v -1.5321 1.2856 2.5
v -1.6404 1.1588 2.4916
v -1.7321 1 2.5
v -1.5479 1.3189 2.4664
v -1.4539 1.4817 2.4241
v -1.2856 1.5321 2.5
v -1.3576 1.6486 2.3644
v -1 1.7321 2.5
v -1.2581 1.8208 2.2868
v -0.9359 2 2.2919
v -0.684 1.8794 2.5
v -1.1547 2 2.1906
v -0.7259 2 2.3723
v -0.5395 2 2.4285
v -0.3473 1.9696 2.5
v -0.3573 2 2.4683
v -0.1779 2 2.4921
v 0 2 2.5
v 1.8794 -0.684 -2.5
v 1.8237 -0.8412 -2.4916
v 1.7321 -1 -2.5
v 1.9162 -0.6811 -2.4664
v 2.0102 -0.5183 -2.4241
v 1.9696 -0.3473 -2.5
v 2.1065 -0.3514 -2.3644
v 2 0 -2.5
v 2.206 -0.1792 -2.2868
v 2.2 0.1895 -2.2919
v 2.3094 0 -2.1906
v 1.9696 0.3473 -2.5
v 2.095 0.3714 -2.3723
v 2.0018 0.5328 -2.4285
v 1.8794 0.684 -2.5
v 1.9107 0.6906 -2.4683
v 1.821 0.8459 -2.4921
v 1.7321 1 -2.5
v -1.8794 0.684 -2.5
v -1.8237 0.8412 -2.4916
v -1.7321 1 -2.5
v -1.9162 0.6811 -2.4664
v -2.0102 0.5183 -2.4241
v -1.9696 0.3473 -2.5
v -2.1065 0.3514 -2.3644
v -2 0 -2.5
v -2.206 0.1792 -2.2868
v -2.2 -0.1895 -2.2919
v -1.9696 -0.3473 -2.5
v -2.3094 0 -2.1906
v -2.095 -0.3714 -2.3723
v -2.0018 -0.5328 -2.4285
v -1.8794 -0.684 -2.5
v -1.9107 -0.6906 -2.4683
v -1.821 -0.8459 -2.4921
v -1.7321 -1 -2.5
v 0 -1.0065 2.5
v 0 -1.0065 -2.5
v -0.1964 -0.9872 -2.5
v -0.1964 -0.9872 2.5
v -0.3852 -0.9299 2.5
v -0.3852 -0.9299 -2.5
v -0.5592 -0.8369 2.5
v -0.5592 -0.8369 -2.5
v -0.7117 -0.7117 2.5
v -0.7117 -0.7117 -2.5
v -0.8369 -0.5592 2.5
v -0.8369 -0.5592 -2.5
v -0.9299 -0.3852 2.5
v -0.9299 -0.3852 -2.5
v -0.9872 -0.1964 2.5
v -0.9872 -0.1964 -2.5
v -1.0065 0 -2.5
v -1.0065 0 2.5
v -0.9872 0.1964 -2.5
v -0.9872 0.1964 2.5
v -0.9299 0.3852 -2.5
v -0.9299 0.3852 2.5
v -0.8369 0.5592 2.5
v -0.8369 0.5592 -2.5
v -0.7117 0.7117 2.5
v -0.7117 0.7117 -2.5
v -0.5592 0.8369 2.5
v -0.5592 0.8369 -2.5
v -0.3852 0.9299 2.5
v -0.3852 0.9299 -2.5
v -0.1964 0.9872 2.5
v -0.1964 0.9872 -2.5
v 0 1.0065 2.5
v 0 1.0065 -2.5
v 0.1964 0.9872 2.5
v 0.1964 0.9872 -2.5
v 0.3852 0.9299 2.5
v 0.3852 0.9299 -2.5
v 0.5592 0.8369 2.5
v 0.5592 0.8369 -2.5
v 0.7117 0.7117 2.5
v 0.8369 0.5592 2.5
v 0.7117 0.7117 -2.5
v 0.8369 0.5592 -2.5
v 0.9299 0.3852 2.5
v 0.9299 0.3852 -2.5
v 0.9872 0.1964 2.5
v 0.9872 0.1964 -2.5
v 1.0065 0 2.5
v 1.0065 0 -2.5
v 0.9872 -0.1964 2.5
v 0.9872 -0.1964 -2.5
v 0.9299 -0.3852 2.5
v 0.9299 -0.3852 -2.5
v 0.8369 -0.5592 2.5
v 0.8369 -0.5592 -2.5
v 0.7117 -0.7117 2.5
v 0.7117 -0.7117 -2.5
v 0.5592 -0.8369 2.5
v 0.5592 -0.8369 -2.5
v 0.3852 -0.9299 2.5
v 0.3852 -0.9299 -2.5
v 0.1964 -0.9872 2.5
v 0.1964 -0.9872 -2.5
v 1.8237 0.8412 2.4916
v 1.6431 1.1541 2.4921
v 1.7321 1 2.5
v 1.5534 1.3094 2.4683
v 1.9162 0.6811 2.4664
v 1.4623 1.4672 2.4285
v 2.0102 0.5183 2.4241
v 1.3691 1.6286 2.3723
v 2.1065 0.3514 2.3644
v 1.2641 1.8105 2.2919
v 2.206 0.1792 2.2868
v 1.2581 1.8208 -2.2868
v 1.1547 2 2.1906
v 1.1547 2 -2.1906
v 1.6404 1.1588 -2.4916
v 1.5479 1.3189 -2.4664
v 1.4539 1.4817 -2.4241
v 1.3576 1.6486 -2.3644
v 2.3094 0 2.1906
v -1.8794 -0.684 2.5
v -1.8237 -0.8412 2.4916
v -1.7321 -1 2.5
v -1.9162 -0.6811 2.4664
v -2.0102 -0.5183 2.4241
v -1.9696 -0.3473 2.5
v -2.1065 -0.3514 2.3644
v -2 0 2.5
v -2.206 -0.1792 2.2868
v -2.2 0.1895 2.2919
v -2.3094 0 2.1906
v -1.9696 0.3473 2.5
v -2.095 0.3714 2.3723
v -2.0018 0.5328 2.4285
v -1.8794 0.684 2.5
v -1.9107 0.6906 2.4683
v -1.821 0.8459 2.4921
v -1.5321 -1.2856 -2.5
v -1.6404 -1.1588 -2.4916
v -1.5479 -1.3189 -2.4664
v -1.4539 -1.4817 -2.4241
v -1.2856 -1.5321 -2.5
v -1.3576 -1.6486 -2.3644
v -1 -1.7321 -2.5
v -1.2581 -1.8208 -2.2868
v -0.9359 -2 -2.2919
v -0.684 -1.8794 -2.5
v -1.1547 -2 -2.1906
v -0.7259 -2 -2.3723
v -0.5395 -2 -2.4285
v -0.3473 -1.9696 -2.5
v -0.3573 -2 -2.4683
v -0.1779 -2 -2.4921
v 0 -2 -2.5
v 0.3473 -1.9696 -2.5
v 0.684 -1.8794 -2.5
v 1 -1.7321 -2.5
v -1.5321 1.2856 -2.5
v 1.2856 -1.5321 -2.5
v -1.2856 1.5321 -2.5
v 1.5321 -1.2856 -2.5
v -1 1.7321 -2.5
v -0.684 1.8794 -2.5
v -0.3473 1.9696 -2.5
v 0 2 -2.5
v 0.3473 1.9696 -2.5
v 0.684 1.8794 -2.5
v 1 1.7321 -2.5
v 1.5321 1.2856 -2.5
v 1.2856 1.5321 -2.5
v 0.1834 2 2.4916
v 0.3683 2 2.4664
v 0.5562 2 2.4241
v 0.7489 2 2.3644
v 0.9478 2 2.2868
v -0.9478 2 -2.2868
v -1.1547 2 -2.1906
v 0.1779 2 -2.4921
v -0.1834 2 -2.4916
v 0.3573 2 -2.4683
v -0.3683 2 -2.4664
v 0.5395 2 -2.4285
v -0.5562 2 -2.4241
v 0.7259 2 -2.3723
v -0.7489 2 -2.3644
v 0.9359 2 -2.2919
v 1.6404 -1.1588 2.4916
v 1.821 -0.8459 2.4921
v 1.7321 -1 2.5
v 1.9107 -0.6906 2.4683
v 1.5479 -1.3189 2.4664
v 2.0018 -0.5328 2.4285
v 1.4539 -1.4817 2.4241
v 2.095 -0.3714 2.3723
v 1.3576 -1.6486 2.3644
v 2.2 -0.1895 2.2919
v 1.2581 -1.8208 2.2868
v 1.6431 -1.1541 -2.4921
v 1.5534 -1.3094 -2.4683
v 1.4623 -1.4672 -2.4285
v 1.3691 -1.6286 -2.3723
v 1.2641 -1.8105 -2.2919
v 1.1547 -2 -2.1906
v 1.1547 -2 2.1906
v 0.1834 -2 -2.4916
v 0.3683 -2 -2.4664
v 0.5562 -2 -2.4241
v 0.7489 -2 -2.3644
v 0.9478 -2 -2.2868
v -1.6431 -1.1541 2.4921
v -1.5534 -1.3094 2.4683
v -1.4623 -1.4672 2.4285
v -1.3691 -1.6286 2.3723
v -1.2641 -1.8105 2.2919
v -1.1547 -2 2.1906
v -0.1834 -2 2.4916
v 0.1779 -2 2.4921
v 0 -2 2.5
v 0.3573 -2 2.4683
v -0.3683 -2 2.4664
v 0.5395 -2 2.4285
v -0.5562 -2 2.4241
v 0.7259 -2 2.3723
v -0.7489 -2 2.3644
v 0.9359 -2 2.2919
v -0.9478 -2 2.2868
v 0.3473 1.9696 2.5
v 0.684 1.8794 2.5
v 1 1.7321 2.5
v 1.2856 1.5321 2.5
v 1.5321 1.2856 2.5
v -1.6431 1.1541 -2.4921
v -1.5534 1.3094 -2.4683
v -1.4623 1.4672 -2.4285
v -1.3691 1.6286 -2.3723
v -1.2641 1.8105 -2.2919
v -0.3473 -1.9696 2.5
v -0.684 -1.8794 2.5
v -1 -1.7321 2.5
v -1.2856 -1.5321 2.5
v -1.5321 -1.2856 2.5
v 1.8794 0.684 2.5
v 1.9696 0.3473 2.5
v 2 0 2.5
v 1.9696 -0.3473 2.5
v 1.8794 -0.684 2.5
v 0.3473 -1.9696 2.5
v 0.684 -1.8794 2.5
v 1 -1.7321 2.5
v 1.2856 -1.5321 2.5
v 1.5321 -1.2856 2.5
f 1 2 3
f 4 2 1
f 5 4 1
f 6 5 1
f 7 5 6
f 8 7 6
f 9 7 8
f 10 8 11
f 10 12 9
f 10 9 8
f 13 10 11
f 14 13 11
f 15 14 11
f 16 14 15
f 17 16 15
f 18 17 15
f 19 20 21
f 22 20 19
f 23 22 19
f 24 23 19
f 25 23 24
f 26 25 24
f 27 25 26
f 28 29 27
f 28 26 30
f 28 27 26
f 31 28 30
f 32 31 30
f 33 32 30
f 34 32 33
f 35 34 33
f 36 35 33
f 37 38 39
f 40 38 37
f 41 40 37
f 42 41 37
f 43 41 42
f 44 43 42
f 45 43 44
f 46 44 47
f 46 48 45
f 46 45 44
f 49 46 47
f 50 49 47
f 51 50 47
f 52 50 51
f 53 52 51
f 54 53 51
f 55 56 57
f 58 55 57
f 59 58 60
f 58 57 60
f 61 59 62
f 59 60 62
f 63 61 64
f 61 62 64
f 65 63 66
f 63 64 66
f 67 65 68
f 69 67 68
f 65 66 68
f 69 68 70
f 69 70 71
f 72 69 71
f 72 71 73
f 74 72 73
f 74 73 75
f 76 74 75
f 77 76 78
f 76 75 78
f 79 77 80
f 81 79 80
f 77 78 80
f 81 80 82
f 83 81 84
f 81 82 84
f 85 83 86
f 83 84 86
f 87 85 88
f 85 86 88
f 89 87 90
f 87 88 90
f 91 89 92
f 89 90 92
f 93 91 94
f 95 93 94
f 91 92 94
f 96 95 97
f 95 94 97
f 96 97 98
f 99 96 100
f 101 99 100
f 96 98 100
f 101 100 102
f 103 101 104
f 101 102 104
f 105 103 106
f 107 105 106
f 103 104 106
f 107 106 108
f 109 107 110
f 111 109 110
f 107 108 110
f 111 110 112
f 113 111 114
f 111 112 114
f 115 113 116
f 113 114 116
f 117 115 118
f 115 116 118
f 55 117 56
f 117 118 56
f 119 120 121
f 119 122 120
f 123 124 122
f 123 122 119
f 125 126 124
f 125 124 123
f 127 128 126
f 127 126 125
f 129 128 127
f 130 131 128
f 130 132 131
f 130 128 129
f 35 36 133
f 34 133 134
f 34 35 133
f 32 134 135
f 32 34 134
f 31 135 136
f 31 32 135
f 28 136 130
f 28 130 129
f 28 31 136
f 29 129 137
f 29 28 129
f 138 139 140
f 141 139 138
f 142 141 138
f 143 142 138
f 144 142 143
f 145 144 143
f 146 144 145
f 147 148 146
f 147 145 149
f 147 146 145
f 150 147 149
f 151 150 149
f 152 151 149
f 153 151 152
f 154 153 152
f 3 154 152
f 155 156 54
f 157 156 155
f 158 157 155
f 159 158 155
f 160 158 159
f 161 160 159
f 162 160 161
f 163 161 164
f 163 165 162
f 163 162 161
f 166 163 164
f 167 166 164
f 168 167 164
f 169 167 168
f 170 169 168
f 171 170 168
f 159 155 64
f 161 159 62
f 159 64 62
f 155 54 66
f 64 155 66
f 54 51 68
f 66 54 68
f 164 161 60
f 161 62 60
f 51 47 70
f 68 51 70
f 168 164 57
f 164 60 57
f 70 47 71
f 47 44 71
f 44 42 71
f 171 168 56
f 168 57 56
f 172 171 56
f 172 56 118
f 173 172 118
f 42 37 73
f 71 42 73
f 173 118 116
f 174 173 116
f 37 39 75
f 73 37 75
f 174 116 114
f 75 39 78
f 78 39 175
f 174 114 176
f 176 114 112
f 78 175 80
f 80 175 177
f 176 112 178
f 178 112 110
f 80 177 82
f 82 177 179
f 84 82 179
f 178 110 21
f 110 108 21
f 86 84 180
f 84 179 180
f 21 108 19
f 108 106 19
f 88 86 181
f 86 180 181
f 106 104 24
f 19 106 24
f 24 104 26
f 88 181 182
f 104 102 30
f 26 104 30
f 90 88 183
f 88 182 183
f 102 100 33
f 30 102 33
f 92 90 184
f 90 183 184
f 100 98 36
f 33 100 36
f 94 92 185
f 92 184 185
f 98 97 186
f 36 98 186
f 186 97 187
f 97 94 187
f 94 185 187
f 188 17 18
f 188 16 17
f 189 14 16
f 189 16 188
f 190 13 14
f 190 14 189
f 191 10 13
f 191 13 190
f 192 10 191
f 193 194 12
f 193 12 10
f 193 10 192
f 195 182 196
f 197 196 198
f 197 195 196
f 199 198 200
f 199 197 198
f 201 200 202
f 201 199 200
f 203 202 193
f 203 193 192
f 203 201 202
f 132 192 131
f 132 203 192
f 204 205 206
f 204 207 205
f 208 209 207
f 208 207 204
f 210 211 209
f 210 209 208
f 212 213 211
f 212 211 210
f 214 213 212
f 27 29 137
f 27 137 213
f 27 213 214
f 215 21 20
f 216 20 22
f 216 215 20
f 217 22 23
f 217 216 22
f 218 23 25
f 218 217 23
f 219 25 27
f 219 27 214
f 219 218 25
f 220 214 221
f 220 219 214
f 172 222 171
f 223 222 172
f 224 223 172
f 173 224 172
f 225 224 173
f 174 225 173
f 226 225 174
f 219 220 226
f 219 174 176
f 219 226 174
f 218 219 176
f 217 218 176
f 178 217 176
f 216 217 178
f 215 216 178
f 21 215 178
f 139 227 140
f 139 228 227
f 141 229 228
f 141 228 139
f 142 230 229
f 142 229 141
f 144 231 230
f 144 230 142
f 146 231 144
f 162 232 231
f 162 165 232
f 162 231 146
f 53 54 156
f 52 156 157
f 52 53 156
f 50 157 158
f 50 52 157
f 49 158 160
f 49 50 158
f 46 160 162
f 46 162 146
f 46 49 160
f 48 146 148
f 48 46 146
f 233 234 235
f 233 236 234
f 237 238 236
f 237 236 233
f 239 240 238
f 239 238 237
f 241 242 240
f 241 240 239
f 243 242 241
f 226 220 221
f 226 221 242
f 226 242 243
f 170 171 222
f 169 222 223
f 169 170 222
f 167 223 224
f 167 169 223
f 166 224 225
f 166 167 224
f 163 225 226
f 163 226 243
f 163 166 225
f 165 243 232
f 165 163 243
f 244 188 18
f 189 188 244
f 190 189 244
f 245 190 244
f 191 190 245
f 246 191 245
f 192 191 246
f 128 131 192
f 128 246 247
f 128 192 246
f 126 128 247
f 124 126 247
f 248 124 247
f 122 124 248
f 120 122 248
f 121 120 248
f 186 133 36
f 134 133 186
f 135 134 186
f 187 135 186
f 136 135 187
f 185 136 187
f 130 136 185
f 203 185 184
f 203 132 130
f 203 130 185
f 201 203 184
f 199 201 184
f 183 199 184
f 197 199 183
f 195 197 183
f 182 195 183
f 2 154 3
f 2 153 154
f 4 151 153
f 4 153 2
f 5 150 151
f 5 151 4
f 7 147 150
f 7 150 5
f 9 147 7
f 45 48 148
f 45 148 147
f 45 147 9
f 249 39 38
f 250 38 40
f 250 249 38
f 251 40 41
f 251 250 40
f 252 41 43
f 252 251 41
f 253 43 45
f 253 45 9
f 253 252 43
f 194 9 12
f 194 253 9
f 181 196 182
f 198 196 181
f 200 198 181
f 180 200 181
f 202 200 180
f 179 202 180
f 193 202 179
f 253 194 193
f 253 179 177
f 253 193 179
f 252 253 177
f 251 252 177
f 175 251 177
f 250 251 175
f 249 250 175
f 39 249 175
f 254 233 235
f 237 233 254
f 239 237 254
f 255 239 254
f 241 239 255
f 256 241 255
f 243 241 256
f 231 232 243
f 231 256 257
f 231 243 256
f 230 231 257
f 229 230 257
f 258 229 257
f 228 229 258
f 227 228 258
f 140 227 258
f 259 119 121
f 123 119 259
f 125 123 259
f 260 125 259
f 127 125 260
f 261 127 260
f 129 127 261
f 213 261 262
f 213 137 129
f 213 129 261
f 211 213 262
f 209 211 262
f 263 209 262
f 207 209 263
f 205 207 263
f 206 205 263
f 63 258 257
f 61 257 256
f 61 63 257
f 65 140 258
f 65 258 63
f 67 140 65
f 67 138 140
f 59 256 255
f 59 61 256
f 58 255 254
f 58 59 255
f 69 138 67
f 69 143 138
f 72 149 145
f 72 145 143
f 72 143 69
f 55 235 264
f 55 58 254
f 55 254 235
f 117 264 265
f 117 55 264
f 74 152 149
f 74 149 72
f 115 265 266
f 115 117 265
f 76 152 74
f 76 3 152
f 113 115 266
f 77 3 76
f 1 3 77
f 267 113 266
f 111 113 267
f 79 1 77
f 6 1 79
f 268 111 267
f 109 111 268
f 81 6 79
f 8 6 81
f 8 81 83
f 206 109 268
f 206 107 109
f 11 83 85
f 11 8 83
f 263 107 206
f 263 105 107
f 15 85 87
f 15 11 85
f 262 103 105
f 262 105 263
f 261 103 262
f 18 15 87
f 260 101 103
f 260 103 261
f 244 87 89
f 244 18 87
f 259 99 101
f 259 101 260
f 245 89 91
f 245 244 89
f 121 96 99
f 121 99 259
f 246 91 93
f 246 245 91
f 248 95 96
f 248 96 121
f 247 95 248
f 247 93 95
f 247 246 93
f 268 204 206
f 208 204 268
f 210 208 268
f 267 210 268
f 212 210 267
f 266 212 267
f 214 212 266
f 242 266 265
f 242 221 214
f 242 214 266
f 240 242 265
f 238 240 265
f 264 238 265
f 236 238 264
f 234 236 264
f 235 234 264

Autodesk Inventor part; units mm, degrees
ref_plane "YZ Plane" through (0, 0, 0) normal (1, 0, 0) x (0, 1, 0)
ref_plane "XZ Plane" through (0, 0, 0) normal (0, 1, 0) x (-1, 0, 0)
ref_plane "XY Plane" through (0, 0, 0) normal (0, 0, 1) x (1, 0, 0)
sketch "Skizze1" plane through (0, 0, 0) normal (0, 0, 1) x (1, 0, 0)
  line L0 (2.3094, 0) -> (1.1547, -2)
  line L1 (1.1547, -2) -> (-1.1547, -2)
  line L2 (-1.1547, -2) -> (-2.3094, 0)
  line L3 (-2.3094, 0) -> (-1.1547, 2)
  line L4 (-1.1547, 2) -> (1.1547, 2)
  line L5 (1.1547, 2) -> (2.3094, 0)
  point P0 (0, 0)
  point P1 (0, 0)
  dimension "SW" = 4
extrude "Extrusion1" add sketch "Skizze1" along normal mid plane 5
sketch "Skizze2" plane through (0, 0, 2.5) normal (0, 0, 1) x (1, 0, 0)
  point P0 (0, 0)
  point P1 (0, 0)
hole "Bohrung1" at (0, 0, 2.5) direction (0, 0, -1) diameter 2.013 end through all thread size "M2.5x0.45" class "6H" standard "ISO Metric profile"
sketch "Innenradius" plane through (0, 0, 2.5) normal (0, 0, 1) x (1, 0, 0)
  circle A0 centre (0, 0) radius 2
  line L0 (2.3094, 0) -> (1.1547, 2) projected
sketch "Skizze7" plane through (0, 0, 0) normal (0, 1, 0) x (-1, 0, 0)
  line L0 (-1.0065, 2.5) -> (1.0065, 2.5) projected
  line L1 (-1.1547, 2.5) -> (-2.3094, 2.5) projected
  line L2 (-2.3094, 2.5) -> (-1.1547, 2.5) projected
  line L3 (-1.1547, 2.5) -> (1.1547, 2.5) projected
  line L4 (1.1547, 2.5) -> (2.3094, 2.5) projected
  line L5 (2.3094, 2.5) -> (1.1547, 2.5) projected
  line L6 (1.1547, 2.5) -> (-1.1547, 2.5) projected
  line L7 (1.0065, -2.5) -> (-1.0065, -2.5) projected
  line L8 (-2.3094, -2.5) -> (-1.1547, -2.5) projected
  line L9 (-1.1547, -2.5) -> (1.1547, -2.5) projected
  line L10 (1.1547, -2.5) -> (2.3094, -2.5) projected
  line L11 (2.3094, -2.5) -> (1.1547, -2.5) projected
  line L12 (1.1547, -2.5) -> (-1.1547, -2.5) projected
  line L13 (-1.1547, -2.5) -> (-2.3094, -2.5) projected
  line L14 (0, -4.2) -> (0, 4.2) projected
  line L15 (0, 2.5) -> (0, -2.5)
  line L16 (2, 2.5) -> (-2, 2.5) projected
  line L17 (2, 2.5) -> (2.3094, 2.5)
  line L18 (2.3094, 2.1906) -> (2, 2.5)
  line L19 (2.3094, 2.5) -> (2.3094, 2.1906)
  point P0 (0, 0)
  dimension "d16" = 45
revolve "Umdrehung1" cut sketch "Skizze7" angle 360 about axis through (0, 0, 0) along (0, 0, 1)
mirror "Spiegeln1" about plane through (0, 0, 0) normal (0, 0, 1) of "Umdrehung1"
properties part number "M2.5x5" material "Stahl"
